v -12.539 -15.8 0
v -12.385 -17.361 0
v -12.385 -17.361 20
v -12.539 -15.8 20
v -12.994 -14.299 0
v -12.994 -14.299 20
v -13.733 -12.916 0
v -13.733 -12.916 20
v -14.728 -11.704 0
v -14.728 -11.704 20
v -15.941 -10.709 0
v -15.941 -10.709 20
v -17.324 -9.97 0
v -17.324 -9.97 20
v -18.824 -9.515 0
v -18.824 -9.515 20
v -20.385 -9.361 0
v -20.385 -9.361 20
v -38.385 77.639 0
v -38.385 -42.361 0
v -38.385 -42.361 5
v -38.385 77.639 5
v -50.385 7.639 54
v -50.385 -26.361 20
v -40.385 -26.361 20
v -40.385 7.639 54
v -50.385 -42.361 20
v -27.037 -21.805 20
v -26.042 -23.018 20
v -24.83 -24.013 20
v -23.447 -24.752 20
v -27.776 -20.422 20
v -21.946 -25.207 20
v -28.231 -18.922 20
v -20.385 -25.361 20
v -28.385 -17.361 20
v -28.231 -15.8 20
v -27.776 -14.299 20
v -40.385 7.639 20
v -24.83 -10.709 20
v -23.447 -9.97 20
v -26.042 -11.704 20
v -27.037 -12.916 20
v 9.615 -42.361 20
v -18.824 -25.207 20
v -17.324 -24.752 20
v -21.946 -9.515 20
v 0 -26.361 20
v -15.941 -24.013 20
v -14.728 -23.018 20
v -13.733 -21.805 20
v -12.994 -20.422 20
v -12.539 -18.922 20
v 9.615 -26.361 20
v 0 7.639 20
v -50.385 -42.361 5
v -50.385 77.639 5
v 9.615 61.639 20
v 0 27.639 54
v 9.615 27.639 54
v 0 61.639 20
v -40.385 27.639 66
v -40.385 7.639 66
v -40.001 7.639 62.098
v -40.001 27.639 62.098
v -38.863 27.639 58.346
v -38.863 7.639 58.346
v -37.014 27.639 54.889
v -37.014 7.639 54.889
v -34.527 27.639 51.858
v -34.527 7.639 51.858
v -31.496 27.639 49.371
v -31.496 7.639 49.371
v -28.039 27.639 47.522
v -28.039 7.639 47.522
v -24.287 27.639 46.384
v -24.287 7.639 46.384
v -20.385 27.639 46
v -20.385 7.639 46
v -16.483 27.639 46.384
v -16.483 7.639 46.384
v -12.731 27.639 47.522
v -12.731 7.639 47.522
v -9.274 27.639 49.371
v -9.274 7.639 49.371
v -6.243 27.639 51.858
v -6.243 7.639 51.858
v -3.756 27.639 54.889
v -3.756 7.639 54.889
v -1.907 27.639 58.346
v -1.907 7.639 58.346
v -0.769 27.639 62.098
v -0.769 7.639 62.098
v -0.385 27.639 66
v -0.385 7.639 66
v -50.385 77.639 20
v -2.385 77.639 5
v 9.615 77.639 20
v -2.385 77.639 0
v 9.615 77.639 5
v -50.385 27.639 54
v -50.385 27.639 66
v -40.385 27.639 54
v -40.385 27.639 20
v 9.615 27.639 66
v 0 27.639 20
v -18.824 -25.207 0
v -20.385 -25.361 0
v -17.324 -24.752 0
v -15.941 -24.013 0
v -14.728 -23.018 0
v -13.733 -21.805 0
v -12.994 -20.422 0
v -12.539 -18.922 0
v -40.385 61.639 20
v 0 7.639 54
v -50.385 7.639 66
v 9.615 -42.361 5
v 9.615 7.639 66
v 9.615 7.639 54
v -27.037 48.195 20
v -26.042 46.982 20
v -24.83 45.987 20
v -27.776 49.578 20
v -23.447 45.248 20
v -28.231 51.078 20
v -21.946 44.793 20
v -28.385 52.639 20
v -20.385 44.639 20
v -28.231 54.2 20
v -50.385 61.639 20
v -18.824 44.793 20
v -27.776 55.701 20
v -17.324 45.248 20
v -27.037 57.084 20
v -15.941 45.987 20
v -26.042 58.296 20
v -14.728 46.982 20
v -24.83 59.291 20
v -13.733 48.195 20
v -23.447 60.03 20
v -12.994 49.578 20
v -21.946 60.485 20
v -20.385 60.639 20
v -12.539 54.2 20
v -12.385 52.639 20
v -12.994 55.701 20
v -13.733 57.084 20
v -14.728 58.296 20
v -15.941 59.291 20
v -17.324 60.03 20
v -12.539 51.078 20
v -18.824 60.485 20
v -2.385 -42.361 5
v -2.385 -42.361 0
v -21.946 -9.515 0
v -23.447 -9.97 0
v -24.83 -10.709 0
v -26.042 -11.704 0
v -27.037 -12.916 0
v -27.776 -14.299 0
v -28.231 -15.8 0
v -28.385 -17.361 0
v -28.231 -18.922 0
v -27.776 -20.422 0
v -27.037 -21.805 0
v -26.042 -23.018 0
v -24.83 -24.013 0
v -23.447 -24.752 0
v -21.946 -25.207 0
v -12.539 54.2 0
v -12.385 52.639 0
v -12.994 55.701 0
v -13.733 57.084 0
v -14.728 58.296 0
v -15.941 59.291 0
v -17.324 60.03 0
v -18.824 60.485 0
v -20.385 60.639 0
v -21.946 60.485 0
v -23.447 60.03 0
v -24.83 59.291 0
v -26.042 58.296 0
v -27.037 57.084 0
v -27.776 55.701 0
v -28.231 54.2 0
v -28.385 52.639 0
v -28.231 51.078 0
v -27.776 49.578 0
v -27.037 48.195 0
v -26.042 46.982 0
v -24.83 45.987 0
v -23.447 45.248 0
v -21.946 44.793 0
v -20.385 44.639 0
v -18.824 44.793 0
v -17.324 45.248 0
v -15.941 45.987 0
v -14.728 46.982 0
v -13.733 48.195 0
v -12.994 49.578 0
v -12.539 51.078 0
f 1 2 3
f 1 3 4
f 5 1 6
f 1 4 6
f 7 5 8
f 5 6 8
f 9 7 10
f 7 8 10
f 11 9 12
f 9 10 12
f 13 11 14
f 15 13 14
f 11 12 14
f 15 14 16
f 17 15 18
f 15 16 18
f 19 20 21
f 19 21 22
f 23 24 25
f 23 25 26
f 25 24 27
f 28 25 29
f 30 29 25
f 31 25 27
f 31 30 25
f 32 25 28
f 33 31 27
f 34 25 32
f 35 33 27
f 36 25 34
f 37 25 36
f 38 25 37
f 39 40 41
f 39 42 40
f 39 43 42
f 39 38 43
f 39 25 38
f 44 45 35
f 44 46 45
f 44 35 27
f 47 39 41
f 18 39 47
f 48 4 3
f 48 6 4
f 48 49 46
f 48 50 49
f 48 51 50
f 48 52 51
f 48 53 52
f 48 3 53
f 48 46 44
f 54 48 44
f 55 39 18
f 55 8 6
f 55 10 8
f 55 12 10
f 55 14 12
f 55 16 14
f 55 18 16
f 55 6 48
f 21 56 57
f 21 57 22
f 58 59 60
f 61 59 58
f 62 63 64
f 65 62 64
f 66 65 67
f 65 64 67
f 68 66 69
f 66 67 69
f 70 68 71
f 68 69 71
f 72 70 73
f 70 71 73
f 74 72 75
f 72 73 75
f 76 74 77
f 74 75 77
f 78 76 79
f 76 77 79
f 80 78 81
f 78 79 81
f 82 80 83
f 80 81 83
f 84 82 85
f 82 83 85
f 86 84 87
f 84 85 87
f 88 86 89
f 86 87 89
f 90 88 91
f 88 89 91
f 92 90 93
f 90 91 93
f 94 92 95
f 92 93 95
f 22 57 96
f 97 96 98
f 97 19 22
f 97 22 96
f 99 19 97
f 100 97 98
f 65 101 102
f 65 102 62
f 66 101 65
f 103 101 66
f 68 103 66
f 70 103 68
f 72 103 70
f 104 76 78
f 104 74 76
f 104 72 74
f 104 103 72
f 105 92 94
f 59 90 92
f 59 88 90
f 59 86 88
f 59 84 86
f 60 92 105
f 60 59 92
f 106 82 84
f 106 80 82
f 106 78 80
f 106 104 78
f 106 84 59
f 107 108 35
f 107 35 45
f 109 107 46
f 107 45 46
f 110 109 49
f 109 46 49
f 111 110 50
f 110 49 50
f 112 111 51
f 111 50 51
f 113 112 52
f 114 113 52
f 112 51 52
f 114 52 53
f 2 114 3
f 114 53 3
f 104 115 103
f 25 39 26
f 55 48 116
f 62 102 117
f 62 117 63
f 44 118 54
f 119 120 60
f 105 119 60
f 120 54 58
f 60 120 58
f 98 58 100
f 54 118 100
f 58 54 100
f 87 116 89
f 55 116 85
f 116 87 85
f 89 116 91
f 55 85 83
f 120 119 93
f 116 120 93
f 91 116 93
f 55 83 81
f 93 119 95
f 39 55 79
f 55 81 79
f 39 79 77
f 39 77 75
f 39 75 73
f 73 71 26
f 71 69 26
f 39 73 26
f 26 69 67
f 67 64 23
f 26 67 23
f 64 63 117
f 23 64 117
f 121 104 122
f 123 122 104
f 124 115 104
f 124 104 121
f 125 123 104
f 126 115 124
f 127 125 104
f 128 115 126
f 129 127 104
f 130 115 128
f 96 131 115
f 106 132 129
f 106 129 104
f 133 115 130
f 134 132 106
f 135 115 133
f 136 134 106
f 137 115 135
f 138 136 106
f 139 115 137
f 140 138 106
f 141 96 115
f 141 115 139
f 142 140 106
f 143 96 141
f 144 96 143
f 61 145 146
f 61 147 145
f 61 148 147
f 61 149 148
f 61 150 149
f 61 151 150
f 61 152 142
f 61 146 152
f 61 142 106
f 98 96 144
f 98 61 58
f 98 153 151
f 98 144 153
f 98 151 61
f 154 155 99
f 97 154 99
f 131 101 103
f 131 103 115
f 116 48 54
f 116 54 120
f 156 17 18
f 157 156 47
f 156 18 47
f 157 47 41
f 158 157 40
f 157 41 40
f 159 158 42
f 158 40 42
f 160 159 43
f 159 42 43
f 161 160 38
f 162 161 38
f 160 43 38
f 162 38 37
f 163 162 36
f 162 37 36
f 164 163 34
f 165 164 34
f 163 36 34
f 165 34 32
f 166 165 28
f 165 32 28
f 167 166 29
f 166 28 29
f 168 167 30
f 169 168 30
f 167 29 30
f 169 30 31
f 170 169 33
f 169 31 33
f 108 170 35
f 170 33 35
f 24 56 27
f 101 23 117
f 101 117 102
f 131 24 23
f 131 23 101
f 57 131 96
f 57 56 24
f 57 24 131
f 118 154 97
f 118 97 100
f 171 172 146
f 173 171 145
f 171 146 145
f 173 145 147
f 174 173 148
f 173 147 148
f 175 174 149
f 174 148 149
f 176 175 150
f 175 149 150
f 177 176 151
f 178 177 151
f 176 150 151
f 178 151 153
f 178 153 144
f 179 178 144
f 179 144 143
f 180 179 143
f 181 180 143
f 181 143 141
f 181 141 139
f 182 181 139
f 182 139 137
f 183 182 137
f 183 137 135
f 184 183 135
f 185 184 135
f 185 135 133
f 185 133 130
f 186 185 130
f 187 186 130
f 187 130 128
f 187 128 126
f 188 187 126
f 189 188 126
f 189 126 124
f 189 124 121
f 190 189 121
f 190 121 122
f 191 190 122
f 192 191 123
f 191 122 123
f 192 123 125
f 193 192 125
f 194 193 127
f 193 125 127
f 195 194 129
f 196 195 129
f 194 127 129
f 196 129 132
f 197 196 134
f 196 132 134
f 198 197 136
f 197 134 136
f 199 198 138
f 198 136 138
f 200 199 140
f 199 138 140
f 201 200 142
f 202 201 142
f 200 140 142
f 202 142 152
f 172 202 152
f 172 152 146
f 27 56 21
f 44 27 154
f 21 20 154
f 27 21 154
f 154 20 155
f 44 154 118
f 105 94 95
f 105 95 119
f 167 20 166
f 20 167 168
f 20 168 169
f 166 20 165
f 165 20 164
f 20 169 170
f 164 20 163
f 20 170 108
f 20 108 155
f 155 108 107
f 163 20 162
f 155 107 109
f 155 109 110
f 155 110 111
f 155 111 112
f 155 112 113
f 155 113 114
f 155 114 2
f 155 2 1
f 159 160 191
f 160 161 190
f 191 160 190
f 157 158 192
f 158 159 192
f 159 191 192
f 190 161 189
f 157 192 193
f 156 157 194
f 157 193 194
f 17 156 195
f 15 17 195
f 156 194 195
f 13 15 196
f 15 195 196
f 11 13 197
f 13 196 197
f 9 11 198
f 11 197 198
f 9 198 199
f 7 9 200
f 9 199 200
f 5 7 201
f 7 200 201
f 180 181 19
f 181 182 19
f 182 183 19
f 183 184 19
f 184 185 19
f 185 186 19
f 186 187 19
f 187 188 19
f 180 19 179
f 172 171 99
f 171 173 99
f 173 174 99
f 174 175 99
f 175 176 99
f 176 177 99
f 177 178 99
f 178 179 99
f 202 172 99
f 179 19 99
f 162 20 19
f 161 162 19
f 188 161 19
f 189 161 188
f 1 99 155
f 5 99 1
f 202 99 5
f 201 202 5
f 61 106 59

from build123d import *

# Parameters (mm, degrees)
F0_W           = 60
F0_H           = 120
F1_DEPTH       = 20
F3_W           = 12
F3_H           = 120
F4_DEPTH       = 5
F5_R           = 8
F6_DEPTH       = 45.4
F7_W           = 60
F7_H           = 20
F8_DEPTH       = 46
F11_DEPTH      = 60
F13_DEPTH      = 212.7
F13_DEPTH_BACK = 25
F15_DEPTH      = 46


with BuildPart() as f1:
    # F0 (on Top) → F1 (new body)
    with BuildSketch(Plane.XY):
        with Locations((-20.3850728273, 17.6392173767)):
            Rectangle(F0_W, F0_H)
    extrude(amount=F1_DEPTH)

    # F3 (on face) → F4 (cut)
    with BuildSketch(Plane.XY):
        with Locations((-44.3850728273, 17.6392173767)):
            Rectangle(F3_W, F3_H)
        with Locations((3.6149271727, 17.6392173767)):
            Rectangle(F3_W, F3_H)
    extrude(amount=F4_DEPTH, mode=Mode.SUBTRACT)

    # F5 (on face) → F6 (cut)
    with BuildSketch(Plane.XY.offset(20)):
        with BuildLine():
            ThreePointArc((-20.3850728273, -9.3607826233), (-28.3850728273, -17.3607826233), (-20.3850728273, -25.3607826233))
            Line((-20.3850728273, -25.3607826233), (-20.3850728273, -17.3607826233))
            Line((-20.3850728273, -17.3607826233), (-20.3850728273, -9.3607826233))
        make_face()
        with BuildLine():
            Line((-20.3850728273, -17.3607826233), (-20.3850728273, -25.3607826233))
            ThreePointArc((-20.3850728273, -25.3607826233), (-14.7282185778, -23.0176368728), (-12.3850728273, -17.3607826233))
            Line((-12.3850728273, -17.3607826233), (-20.3850728273, -17.3607826233))
        make_face()
        with BuildLine():
            Line((-20.3850728273, -9.3607826233), (-20.3850728273, -17.3607826233))
            Line((-20.3850728273, -17.3607826233), (-12.3850728273, -17.3607826233))
            ThreePointArc((-12.3850728273, -17.3607826233), (-14.7282185778, -11.7039283738), (-20.3850728273, -9.3607826233))
        make_face()
        with Locations((-20.3850728273, 52.6392173767)):
            Circle(F5_R)
    extrude(amount=-F6_DEPTH, mode=Mode.SUBTRACT)

    # F7 (on face) → F8 (join)
    with BuildSketch(Plane.XY.offset(20)):
        with Locations((-20.3850728273, 17.6392173767)):
            Rectangle(F7_W, F7_H)
    extrude(amount=F8_DEPTH)

    # F10 (on face) → F11 (join)
    with BuildSketch(Plane(origin=(-50.3850728273, 0, 0), x_dir=(0, -1, 0), z_dir=(-1, 0, 0))):
        Polygon((-7.6392173767, 20), (26.3607826233, 20), (-7.6392173767, 54), align=None)
        Polygon((-27.6392173767, 54), (-61.6392173767, 20), (-27.6392173767, 20), align=None)
    extrude(amount=-F11_DEPTH)

    # F12 (on face) → F13 (cut, two sides)
    with BuildSketch(Plane.XZ.offset(-7.6392173767)) as f13_sk:
        with BuildLine():
            ThreePointArc((-40.3850728273, 66), (-20.3850728273, 46), (-0.3850728273, 66))
            Line((-0.3850728273, 66), (-40.3850728273, 66))
        make_face()
        with BuildLine():
            Line((-40.3850728273, 66), (-0.3850728273, 66))
            ThreePointArc((-0.3850728273, 66), (-20.3850728273, 86), (-40.3850728273, 66))
        make_face()
    extrude(amount=-F13_DEPTH, mode=Mode.SUBTRACT)
    extrude(f13_sk.sketch, amount=F13_DEPTH_BACK, mode=Mode.SUBTRACT)

    # F14 (on face) → F15 (cut, through all)
    with BuildSketch(Plane.XY.offset(66)):
        Polygon((-40.3850728273, 61.7061406374), (-40.3850728273, 27.6392173767), (-0.3850728273, 27.6392173767), (0, 27.6392173767), (0, 61.7061406374), align=None)
        Polygon((-0.3850728273, 7.6392173767), (-40.3850728273, 7.6392173767), (-40.3850728273, -26.4050289989), (0, -26.4050289989), (0, 7.6392173767), align=None)
    extrude(amount=-F15_DEPTH, mode=Mode.SUBTRACT)


solid = f1.part
